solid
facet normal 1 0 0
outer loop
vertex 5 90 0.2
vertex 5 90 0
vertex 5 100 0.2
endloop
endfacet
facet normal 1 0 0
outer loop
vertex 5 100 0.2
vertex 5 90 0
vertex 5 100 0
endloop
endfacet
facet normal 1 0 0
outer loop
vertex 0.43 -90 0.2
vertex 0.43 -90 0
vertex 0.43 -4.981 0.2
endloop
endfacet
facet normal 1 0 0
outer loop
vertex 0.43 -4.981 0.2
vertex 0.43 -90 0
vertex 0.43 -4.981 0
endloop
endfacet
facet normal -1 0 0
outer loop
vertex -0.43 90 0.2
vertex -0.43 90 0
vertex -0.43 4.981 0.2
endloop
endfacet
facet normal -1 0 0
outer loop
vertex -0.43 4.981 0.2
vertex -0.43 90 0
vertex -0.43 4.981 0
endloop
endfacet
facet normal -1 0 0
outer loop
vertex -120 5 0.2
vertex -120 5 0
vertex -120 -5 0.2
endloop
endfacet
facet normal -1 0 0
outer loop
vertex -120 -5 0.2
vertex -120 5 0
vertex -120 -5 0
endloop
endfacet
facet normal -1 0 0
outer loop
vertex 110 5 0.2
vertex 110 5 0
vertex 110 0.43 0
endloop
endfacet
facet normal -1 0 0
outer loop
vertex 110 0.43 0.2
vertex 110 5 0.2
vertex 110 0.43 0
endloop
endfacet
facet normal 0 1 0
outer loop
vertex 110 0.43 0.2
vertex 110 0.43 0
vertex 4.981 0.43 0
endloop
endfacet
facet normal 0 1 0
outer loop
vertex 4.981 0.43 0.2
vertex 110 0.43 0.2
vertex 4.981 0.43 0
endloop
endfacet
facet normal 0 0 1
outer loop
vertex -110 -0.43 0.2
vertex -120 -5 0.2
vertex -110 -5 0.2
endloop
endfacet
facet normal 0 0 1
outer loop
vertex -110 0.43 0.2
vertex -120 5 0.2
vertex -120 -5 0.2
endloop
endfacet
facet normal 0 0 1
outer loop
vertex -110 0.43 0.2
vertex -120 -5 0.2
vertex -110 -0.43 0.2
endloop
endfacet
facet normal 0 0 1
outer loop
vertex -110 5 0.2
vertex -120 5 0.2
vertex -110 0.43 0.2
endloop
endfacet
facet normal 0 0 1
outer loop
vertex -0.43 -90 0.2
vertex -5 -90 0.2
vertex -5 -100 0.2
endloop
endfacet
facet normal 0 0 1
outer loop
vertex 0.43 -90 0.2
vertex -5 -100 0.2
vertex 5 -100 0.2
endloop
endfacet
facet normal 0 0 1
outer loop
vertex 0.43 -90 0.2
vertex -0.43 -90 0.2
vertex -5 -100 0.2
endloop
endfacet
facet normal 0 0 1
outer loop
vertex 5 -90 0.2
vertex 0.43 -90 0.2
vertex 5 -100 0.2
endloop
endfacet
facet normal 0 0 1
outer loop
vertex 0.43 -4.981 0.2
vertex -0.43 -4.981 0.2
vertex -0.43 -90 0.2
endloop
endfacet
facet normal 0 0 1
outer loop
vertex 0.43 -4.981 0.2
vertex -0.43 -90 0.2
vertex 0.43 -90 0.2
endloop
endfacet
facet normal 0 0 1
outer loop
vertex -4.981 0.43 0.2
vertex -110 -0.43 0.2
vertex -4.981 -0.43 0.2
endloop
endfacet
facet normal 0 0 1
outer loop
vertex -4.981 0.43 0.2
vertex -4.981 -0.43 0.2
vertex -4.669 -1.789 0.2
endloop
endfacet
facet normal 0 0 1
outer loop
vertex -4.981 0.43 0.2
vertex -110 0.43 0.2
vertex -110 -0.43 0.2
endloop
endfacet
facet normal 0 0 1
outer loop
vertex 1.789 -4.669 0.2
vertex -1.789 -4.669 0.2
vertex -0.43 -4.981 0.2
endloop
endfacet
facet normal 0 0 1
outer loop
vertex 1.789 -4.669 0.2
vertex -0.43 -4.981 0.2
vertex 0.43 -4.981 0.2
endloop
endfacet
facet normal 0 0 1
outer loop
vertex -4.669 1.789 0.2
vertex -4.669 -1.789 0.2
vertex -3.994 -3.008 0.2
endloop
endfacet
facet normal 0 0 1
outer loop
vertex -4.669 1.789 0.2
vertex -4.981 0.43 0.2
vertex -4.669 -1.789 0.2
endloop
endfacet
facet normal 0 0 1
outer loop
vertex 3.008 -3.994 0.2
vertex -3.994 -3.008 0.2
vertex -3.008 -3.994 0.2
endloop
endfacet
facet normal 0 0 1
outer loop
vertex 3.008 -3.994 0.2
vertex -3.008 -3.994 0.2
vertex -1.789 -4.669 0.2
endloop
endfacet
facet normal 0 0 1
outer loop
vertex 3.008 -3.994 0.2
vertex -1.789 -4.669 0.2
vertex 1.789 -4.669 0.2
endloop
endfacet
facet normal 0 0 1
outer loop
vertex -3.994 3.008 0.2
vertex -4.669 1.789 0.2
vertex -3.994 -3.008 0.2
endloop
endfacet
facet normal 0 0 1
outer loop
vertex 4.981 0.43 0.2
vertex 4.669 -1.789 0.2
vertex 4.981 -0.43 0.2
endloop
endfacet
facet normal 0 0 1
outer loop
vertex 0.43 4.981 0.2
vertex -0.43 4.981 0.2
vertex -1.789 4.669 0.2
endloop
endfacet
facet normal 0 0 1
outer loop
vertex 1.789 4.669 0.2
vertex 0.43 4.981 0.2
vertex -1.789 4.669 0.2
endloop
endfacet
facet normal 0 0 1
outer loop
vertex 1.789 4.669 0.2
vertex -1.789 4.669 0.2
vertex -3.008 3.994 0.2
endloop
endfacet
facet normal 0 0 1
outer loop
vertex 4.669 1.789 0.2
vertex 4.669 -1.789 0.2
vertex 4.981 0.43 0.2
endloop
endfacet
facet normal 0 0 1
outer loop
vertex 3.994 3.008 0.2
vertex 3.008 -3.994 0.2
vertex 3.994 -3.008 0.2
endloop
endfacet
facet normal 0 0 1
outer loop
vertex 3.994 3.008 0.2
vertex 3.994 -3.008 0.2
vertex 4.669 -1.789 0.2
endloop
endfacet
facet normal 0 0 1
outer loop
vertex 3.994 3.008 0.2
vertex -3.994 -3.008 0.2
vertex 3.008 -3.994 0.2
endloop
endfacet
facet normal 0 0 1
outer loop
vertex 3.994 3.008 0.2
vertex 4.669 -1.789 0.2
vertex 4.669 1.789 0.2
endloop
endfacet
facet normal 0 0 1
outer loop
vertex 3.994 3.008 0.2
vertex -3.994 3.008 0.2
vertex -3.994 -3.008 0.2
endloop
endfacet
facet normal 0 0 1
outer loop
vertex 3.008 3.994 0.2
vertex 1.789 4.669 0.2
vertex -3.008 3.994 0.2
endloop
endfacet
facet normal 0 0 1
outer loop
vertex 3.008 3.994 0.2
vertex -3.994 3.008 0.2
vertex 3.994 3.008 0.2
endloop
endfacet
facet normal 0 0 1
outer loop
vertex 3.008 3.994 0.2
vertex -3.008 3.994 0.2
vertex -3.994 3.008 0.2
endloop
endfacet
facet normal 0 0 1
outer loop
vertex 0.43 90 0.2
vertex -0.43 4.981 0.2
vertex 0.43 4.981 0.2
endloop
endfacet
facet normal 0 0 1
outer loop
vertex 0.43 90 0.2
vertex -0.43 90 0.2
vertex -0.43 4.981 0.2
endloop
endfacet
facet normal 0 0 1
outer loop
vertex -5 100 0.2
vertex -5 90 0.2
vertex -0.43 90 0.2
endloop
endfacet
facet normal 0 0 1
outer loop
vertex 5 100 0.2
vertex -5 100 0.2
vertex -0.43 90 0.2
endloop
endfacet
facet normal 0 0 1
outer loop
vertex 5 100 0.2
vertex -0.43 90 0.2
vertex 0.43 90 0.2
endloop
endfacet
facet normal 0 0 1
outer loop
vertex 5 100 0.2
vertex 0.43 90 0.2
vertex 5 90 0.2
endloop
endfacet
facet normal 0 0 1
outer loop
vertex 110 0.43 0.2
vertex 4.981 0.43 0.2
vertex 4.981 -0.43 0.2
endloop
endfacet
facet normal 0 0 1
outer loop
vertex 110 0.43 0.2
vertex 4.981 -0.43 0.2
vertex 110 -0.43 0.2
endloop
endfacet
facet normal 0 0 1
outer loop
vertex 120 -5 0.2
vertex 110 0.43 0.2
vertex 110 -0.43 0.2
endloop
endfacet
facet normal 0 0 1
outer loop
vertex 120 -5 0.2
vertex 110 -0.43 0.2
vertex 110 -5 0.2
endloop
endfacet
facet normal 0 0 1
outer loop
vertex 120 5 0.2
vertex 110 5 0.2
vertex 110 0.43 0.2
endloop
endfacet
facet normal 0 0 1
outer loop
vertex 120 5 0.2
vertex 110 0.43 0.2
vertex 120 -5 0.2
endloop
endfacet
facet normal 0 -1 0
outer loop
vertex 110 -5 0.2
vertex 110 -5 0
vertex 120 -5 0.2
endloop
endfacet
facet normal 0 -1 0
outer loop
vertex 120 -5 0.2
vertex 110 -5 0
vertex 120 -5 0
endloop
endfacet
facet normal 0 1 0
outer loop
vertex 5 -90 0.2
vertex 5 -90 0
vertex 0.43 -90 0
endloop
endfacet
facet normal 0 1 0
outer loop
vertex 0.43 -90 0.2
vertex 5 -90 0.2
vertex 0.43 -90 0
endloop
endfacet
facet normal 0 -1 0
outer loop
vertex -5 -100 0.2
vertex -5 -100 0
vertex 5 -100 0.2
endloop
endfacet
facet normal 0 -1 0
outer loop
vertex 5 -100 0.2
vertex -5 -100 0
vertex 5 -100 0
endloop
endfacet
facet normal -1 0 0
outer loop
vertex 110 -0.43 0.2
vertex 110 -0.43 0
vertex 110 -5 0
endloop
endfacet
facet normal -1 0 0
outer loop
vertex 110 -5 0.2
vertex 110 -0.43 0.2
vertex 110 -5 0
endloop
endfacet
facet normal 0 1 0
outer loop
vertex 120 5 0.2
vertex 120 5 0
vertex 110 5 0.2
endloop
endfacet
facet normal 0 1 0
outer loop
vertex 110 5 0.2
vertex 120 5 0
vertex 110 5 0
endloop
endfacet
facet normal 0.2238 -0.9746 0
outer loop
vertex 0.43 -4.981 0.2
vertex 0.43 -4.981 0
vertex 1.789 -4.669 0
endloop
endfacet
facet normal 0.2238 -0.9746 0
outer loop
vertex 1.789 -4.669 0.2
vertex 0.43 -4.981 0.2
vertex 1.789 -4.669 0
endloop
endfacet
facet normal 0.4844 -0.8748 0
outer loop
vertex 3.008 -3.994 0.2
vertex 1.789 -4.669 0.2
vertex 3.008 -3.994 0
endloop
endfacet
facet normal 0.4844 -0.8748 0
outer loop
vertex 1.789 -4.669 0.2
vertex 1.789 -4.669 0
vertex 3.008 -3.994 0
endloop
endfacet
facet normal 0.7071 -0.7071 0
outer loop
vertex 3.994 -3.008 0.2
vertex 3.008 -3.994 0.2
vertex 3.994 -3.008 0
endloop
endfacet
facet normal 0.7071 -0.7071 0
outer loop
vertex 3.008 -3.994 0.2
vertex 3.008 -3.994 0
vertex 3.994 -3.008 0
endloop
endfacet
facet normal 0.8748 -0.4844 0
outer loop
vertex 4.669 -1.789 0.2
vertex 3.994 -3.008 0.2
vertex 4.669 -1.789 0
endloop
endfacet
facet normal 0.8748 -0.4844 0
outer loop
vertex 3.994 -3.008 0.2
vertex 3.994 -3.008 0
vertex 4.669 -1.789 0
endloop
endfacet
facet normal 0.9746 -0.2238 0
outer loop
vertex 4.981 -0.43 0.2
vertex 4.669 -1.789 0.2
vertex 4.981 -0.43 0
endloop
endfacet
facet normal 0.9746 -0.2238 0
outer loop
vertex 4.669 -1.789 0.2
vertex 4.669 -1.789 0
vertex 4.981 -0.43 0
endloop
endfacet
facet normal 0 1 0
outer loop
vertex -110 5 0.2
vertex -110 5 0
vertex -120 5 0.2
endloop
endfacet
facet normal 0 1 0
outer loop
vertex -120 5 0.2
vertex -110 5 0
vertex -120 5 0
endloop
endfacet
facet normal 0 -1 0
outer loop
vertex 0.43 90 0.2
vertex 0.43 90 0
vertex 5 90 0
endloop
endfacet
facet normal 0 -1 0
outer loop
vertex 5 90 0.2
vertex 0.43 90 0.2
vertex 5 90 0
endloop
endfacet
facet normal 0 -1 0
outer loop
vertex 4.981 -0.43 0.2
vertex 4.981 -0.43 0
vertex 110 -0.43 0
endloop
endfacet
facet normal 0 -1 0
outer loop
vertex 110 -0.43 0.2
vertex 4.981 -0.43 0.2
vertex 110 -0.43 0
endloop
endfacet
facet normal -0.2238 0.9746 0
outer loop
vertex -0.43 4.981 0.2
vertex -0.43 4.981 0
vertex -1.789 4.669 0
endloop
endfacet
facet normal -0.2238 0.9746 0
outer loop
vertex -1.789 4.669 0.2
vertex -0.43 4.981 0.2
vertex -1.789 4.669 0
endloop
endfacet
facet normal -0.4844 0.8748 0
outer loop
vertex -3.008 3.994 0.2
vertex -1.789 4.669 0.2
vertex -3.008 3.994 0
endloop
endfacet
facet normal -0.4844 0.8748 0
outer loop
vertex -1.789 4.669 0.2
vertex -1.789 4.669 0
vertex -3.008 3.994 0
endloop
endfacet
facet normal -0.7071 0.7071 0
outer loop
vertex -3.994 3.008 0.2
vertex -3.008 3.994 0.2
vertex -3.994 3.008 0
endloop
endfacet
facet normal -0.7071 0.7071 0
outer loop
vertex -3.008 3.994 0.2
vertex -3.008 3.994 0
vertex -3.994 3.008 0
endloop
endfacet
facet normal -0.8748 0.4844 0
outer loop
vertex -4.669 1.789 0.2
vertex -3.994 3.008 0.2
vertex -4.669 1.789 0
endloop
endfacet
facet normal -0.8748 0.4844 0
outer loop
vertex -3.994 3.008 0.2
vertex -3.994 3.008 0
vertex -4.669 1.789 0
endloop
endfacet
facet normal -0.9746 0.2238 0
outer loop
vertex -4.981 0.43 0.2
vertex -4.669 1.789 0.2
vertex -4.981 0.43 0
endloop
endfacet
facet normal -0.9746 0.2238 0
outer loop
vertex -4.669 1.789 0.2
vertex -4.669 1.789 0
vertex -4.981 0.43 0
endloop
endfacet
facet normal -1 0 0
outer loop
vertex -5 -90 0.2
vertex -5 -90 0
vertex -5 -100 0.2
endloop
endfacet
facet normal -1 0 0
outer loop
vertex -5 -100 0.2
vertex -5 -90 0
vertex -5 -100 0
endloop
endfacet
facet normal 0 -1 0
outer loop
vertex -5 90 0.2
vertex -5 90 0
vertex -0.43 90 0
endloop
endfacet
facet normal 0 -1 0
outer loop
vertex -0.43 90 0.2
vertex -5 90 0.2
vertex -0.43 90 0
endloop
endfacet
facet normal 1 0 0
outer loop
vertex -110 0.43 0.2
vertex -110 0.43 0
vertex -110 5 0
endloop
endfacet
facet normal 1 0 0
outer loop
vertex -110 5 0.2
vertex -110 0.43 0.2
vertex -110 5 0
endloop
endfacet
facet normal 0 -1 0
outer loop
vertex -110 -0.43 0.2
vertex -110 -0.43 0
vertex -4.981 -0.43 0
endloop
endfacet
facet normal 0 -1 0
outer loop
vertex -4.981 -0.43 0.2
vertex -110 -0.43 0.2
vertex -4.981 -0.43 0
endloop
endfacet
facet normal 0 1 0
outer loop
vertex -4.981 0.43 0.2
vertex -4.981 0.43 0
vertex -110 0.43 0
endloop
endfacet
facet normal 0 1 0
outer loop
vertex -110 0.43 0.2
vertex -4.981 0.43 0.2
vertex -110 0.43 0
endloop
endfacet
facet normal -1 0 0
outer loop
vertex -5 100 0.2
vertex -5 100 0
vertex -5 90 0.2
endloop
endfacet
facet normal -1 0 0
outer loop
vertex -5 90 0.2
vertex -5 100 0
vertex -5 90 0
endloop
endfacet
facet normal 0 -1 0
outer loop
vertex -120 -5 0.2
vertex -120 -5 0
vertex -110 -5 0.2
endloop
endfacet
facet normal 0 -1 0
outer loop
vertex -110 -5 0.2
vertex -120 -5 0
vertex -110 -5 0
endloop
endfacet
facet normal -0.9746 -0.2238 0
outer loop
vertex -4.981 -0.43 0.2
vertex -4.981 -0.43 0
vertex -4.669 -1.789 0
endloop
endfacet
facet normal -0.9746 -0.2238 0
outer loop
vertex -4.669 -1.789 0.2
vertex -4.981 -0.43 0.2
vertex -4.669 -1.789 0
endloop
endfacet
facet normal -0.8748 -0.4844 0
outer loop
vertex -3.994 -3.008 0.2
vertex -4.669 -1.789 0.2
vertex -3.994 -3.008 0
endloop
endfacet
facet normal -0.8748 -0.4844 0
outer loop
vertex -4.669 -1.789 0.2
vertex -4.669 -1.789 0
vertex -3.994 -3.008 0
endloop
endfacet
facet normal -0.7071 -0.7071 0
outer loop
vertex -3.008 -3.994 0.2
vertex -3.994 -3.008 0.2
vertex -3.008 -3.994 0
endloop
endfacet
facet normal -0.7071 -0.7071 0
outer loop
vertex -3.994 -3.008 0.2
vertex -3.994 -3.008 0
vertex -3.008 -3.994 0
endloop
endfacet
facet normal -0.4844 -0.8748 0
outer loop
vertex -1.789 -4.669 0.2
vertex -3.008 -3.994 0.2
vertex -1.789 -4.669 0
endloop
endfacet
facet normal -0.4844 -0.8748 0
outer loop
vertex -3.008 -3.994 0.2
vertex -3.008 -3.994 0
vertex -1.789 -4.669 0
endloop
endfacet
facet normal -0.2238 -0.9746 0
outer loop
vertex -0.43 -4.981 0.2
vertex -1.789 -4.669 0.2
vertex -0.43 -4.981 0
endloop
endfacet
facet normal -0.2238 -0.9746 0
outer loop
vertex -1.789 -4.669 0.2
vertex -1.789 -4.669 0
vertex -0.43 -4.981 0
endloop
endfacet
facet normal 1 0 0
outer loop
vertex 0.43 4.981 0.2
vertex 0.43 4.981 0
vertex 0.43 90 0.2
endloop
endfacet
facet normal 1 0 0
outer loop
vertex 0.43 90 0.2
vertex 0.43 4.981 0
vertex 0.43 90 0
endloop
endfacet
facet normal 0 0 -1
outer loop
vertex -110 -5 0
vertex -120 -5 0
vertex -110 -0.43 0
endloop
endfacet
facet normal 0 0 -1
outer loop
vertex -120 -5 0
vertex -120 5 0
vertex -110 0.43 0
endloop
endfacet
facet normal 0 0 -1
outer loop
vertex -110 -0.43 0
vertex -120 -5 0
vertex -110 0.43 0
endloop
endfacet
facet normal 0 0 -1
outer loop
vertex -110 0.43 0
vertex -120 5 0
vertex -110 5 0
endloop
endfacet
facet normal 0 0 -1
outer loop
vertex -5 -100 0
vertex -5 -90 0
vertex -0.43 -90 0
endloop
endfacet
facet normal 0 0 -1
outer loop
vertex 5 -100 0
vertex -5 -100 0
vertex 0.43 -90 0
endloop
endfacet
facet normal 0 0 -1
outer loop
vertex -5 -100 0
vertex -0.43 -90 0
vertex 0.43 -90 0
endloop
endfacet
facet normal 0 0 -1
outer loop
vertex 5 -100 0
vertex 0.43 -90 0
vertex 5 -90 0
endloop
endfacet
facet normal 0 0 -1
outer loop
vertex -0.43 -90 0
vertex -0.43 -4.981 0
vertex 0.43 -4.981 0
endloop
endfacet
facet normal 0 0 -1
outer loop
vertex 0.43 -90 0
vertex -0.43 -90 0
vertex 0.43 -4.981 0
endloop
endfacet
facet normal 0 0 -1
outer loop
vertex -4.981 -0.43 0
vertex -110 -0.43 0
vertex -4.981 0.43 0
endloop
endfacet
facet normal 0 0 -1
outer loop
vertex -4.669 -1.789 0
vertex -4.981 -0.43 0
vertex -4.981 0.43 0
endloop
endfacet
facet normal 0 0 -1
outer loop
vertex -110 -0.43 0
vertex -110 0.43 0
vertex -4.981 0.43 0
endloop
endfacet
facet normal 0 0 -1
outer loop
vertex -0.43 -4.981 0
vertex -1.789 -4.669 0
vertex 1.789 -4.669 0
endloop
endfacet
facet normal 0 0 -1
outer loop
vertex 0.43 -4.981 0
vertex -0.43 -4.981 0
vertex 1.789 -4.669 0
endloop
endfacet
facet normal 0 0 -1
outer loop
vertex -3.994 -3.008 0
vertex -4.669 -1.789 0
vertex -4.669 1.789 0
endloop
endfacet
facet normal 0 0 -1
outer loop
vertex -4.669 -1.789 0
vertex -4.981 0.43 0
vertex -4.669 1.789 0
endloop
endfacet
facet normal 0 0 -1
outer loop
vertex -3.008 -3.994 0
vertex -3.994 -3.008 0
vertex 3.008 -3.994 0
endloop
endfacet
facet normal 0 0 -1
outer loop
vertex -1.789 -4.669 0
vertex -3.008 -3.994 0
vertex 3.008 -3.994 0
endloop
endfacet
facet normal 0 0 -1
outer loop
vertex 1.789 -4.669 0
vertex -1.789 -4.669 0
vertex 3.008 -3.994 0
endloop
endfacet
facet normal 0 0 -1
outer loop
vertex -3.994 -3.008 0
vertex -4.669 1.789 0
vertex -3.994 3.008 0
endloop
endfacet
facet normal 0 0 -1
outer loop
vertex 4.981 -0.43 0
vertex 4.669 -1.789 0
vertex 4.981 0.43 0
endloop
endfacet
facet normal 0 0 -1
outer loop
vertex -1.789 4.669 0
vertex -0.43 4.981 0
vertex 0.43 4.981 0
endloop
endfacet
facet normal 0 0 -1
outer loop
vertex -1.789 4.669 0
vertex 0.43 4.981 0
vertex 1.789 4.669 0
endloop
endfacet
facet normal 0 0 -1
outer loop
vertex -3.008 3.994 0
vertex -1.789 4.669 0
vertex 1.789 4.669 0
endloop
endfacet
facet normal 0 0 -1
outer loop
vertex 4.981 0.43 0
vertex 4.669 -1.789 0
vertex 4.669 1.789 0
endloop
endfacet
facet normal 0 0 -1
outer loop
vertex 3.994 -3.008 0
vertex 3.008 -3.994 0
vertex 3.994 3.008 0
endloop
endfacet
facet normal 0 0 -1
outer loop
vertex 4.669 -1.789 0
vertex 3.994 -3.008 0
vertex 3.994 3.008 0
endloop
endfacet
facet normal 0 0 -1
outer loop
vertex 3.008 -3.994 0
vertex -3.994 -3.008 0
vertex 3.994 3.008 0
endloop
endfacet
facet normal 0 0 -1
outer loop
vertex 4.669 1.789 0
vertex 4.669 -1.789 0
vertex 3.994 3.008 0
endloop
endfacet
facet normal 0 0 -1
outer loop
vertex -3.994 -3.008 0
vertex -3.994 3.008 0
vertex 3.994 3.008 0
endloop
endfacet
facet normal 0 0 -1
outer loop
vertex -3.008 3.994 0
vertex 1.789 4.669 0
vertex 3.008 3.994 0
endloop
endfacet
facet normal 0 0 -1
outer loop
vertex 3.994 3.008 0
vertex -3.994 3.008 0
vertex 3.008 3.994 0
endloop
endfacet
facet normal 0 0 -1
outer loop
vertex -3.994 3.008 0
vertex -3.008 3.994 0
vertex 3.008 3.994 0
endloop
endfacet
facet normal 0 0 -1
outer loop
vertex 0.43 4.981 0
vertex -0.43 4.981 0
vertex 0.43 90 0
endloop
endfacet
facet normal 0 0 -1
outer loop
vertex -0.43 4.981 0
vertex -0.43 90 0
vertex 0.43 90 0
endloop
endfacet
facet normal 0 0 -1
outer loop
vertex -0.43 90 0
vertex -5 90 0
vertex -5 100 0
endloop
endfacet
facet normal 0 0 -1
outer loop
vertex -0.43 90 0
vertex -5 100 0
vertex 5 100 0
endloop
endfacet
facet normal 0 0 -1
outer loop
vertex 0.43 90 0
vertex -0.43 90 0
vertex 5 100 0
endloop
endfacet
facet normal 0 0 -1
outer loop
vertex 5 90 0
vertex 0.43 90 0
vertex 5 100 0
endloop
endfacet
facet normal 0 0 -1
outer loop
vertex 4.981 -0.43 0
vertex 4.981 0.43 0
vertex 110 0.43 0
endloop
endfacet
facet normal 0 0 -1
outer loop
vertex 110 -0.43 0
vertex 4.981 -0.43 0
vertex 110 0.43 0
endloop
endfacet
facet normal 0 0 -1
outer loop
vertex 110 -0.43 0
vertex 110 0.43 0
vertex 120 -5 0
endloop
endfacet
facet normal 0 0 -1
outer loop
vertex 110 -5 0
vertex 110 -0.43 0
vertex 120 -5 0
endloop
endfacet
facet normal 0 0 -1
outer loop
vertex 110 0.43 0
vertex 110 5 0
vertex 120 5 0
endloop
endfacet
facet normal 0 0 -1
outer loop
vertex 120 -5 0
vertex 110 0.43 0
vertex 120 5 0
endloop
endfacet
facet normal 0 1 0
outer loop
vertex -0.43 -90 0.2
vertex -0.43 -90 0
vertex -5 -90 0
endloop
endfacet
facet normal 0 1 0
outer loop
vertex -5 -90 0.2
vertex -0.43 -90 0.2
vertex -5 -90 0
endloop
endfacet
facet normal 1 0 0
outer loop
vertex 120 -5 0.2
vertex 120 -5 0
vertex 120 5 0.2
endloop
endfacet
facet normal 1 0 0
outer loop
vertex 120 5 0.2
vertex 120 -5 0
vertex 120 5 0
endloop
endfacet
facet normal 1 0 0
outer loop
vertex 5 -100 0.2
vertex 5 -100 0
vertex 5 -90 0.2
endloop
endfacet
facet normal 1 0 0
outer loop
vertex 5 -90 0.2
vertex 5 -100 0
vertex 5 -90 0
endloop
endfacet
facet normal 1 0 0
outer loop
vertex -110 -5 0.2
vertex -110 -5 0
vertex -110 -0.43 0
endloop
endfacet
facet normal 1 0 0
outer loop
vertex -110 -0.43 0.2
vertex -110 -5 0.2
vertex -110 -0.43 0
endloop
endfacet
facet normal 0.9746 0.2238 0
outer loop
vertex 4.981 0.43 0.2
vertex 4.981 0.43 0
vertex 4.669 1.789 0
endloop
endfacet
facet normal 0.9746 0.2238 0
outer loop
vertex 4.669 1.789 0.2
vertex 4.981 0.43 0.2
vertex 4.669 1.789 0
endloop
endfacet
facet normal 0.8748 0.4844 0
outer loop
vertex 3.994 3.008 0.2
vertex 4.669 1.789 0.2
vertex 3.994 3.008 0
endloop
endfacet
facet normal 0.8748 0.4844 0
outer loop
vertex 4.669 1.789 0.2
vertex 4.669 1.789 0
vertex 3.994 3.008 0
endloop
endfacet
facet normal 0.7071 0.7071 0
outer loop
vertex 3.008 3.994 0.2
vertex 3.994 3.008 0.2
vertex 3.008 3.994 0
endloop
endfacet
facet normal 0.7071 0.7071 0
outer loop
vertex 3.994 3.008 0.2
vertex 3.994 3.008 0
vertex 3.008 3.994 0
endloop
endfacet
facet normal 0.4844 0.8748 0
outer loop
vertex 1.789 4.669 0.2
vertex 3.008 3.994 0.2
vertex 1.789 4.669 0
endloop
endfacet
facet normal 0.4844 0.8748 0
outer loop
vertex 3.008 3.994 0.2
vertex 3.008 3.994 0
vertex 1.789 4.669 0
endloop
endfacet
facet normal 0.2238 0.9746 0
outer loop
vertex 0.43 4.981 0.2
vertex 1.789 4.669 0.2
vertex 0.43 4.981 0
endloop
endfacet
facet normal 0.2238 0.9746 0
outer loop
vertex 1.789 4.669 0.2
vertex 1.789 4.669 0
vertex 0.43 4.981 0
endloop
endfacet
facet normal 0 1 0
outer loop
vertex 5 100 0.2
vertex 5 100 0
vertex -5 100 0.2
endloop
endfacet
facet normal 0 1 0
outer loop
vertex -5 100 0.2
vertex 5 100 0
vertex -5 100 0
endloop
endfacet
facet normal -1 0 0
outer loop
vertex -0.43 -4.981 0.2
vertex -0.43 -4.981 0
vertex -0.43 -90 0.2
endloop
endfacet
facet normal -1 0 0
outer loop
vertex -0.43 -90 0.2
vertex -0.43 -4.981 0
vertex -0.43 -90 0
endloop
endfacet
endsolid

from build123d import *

# Parameters (mm, degrees)
F1_DEPTH = 0.2


# Not quite as in the source:
# - a feature names something its author has since deleted; it is built from what else it names


with BuildPart() as f1:
    # F0 (on Top) → F1 (new body)
    with BuildSketch(Plane.XY):
        Polygon((-110, -0.43), (-110, 0.43), (-110, 5), (-120, 5), (-120, -5), (-110, -5), align=None)
        with BuildLine():
            ThreePointArc((-4.981475685, -0.43), (-5, 0), (-4.981475685, 0.43))
            Line((-4.981475685, 0.43), (-110, 0.43))
            Line((-110, 0.43), (-110, -0.43))
            Line((-110, -0.43), (-4.981475685, -0.43))
        make_face()
        with BuildLine():
            ThreePointArc((-0.43, 4.981475685), (0, 5), (0.43, 4.981475685))
            Line((0.43, 4.981475685), (0.43, 90))
            Line((0.43, 90), (-0.43, 90))
            Line((-0.43, 90), (-0.43, 4.981475685))
        make_face()
        with BuildLine():
            ThreePointArc((4.981475685, 0.43), (4.9953667746, 0.2151994135), (5, 0))
            ThreePointArc((5, 0), (4.9953667746, -0.2151994135), (4.981475685, -0.43))
            Line((4.981475685, -0.43), (110, -0.43))
            Line((110, -0.43), (110, 0.43))
            Line((110, 0.43), (4.981475685, 0.43))
        make_face()
        with BuildLine():
            Line((0.43, -90), (0.43, -4.981475685))
            ThreePointArc((0.43, -4.981475685), (0, -5), (-0.43, -4.981475685))
            Line((-0.43, -4.981475685), (-0.43, -90))
            Line((-0.43, -90), (0.43, -90))
        make_face()
        Polygon((110, 5), (110, 0.43), (110, -0.43), (110, -5), (120, -5), (120, 5), align=None)
        Polygon((5, -90), (0.43, -90), (-0.43, -90), (-5, -90), (-5, -100), (5, -100), align=None)
        Polygon((-0.43, 90), (0.43, 90), (5, 90), (5, 100), (-5, 100), (-5, 90), align=None)
        with BuildLine():
            ThreePointArc((4.981475685, -0.43), (4.9953667746, -0.2151994135), (5, 0))
            ThreePointArc((5, 0), (4.9953667746, 0.2151994135), (4.981475685, 0.43))
            ThreePointArc((4.981475685, 0.43), (3.5355339059, 3.5355339059), (0.43, 4.981475685))
            ThreePointArc((0.43, 4.981475685), (0, 5), (-0.43, 4.981475685))
            ThreePointArc((-0.43, 4.981475685), (-3.5355339059, 3.5355339059), (-4.981475685, 0.43))
            ThreePointArc((-4.981475685, 0.43), (-5, 0), (-4.981475685, -0.43))
            ThreePointArc((-4.981475685, -0.43), (-3.5355339059, -3.5355339059), (-0.43, -4.981475685))
            ThreePointArc((-0.43, -4.981475685), (0, -5), (0.43, -4.981475685))
            ThreePointArc((0.43, -4.981475685), (3.5355339059, -3.5355339059), (4.981475685, -0.43))
        make_face()
    extrude(amount=F1_DEPTH)


solid = f1.part
